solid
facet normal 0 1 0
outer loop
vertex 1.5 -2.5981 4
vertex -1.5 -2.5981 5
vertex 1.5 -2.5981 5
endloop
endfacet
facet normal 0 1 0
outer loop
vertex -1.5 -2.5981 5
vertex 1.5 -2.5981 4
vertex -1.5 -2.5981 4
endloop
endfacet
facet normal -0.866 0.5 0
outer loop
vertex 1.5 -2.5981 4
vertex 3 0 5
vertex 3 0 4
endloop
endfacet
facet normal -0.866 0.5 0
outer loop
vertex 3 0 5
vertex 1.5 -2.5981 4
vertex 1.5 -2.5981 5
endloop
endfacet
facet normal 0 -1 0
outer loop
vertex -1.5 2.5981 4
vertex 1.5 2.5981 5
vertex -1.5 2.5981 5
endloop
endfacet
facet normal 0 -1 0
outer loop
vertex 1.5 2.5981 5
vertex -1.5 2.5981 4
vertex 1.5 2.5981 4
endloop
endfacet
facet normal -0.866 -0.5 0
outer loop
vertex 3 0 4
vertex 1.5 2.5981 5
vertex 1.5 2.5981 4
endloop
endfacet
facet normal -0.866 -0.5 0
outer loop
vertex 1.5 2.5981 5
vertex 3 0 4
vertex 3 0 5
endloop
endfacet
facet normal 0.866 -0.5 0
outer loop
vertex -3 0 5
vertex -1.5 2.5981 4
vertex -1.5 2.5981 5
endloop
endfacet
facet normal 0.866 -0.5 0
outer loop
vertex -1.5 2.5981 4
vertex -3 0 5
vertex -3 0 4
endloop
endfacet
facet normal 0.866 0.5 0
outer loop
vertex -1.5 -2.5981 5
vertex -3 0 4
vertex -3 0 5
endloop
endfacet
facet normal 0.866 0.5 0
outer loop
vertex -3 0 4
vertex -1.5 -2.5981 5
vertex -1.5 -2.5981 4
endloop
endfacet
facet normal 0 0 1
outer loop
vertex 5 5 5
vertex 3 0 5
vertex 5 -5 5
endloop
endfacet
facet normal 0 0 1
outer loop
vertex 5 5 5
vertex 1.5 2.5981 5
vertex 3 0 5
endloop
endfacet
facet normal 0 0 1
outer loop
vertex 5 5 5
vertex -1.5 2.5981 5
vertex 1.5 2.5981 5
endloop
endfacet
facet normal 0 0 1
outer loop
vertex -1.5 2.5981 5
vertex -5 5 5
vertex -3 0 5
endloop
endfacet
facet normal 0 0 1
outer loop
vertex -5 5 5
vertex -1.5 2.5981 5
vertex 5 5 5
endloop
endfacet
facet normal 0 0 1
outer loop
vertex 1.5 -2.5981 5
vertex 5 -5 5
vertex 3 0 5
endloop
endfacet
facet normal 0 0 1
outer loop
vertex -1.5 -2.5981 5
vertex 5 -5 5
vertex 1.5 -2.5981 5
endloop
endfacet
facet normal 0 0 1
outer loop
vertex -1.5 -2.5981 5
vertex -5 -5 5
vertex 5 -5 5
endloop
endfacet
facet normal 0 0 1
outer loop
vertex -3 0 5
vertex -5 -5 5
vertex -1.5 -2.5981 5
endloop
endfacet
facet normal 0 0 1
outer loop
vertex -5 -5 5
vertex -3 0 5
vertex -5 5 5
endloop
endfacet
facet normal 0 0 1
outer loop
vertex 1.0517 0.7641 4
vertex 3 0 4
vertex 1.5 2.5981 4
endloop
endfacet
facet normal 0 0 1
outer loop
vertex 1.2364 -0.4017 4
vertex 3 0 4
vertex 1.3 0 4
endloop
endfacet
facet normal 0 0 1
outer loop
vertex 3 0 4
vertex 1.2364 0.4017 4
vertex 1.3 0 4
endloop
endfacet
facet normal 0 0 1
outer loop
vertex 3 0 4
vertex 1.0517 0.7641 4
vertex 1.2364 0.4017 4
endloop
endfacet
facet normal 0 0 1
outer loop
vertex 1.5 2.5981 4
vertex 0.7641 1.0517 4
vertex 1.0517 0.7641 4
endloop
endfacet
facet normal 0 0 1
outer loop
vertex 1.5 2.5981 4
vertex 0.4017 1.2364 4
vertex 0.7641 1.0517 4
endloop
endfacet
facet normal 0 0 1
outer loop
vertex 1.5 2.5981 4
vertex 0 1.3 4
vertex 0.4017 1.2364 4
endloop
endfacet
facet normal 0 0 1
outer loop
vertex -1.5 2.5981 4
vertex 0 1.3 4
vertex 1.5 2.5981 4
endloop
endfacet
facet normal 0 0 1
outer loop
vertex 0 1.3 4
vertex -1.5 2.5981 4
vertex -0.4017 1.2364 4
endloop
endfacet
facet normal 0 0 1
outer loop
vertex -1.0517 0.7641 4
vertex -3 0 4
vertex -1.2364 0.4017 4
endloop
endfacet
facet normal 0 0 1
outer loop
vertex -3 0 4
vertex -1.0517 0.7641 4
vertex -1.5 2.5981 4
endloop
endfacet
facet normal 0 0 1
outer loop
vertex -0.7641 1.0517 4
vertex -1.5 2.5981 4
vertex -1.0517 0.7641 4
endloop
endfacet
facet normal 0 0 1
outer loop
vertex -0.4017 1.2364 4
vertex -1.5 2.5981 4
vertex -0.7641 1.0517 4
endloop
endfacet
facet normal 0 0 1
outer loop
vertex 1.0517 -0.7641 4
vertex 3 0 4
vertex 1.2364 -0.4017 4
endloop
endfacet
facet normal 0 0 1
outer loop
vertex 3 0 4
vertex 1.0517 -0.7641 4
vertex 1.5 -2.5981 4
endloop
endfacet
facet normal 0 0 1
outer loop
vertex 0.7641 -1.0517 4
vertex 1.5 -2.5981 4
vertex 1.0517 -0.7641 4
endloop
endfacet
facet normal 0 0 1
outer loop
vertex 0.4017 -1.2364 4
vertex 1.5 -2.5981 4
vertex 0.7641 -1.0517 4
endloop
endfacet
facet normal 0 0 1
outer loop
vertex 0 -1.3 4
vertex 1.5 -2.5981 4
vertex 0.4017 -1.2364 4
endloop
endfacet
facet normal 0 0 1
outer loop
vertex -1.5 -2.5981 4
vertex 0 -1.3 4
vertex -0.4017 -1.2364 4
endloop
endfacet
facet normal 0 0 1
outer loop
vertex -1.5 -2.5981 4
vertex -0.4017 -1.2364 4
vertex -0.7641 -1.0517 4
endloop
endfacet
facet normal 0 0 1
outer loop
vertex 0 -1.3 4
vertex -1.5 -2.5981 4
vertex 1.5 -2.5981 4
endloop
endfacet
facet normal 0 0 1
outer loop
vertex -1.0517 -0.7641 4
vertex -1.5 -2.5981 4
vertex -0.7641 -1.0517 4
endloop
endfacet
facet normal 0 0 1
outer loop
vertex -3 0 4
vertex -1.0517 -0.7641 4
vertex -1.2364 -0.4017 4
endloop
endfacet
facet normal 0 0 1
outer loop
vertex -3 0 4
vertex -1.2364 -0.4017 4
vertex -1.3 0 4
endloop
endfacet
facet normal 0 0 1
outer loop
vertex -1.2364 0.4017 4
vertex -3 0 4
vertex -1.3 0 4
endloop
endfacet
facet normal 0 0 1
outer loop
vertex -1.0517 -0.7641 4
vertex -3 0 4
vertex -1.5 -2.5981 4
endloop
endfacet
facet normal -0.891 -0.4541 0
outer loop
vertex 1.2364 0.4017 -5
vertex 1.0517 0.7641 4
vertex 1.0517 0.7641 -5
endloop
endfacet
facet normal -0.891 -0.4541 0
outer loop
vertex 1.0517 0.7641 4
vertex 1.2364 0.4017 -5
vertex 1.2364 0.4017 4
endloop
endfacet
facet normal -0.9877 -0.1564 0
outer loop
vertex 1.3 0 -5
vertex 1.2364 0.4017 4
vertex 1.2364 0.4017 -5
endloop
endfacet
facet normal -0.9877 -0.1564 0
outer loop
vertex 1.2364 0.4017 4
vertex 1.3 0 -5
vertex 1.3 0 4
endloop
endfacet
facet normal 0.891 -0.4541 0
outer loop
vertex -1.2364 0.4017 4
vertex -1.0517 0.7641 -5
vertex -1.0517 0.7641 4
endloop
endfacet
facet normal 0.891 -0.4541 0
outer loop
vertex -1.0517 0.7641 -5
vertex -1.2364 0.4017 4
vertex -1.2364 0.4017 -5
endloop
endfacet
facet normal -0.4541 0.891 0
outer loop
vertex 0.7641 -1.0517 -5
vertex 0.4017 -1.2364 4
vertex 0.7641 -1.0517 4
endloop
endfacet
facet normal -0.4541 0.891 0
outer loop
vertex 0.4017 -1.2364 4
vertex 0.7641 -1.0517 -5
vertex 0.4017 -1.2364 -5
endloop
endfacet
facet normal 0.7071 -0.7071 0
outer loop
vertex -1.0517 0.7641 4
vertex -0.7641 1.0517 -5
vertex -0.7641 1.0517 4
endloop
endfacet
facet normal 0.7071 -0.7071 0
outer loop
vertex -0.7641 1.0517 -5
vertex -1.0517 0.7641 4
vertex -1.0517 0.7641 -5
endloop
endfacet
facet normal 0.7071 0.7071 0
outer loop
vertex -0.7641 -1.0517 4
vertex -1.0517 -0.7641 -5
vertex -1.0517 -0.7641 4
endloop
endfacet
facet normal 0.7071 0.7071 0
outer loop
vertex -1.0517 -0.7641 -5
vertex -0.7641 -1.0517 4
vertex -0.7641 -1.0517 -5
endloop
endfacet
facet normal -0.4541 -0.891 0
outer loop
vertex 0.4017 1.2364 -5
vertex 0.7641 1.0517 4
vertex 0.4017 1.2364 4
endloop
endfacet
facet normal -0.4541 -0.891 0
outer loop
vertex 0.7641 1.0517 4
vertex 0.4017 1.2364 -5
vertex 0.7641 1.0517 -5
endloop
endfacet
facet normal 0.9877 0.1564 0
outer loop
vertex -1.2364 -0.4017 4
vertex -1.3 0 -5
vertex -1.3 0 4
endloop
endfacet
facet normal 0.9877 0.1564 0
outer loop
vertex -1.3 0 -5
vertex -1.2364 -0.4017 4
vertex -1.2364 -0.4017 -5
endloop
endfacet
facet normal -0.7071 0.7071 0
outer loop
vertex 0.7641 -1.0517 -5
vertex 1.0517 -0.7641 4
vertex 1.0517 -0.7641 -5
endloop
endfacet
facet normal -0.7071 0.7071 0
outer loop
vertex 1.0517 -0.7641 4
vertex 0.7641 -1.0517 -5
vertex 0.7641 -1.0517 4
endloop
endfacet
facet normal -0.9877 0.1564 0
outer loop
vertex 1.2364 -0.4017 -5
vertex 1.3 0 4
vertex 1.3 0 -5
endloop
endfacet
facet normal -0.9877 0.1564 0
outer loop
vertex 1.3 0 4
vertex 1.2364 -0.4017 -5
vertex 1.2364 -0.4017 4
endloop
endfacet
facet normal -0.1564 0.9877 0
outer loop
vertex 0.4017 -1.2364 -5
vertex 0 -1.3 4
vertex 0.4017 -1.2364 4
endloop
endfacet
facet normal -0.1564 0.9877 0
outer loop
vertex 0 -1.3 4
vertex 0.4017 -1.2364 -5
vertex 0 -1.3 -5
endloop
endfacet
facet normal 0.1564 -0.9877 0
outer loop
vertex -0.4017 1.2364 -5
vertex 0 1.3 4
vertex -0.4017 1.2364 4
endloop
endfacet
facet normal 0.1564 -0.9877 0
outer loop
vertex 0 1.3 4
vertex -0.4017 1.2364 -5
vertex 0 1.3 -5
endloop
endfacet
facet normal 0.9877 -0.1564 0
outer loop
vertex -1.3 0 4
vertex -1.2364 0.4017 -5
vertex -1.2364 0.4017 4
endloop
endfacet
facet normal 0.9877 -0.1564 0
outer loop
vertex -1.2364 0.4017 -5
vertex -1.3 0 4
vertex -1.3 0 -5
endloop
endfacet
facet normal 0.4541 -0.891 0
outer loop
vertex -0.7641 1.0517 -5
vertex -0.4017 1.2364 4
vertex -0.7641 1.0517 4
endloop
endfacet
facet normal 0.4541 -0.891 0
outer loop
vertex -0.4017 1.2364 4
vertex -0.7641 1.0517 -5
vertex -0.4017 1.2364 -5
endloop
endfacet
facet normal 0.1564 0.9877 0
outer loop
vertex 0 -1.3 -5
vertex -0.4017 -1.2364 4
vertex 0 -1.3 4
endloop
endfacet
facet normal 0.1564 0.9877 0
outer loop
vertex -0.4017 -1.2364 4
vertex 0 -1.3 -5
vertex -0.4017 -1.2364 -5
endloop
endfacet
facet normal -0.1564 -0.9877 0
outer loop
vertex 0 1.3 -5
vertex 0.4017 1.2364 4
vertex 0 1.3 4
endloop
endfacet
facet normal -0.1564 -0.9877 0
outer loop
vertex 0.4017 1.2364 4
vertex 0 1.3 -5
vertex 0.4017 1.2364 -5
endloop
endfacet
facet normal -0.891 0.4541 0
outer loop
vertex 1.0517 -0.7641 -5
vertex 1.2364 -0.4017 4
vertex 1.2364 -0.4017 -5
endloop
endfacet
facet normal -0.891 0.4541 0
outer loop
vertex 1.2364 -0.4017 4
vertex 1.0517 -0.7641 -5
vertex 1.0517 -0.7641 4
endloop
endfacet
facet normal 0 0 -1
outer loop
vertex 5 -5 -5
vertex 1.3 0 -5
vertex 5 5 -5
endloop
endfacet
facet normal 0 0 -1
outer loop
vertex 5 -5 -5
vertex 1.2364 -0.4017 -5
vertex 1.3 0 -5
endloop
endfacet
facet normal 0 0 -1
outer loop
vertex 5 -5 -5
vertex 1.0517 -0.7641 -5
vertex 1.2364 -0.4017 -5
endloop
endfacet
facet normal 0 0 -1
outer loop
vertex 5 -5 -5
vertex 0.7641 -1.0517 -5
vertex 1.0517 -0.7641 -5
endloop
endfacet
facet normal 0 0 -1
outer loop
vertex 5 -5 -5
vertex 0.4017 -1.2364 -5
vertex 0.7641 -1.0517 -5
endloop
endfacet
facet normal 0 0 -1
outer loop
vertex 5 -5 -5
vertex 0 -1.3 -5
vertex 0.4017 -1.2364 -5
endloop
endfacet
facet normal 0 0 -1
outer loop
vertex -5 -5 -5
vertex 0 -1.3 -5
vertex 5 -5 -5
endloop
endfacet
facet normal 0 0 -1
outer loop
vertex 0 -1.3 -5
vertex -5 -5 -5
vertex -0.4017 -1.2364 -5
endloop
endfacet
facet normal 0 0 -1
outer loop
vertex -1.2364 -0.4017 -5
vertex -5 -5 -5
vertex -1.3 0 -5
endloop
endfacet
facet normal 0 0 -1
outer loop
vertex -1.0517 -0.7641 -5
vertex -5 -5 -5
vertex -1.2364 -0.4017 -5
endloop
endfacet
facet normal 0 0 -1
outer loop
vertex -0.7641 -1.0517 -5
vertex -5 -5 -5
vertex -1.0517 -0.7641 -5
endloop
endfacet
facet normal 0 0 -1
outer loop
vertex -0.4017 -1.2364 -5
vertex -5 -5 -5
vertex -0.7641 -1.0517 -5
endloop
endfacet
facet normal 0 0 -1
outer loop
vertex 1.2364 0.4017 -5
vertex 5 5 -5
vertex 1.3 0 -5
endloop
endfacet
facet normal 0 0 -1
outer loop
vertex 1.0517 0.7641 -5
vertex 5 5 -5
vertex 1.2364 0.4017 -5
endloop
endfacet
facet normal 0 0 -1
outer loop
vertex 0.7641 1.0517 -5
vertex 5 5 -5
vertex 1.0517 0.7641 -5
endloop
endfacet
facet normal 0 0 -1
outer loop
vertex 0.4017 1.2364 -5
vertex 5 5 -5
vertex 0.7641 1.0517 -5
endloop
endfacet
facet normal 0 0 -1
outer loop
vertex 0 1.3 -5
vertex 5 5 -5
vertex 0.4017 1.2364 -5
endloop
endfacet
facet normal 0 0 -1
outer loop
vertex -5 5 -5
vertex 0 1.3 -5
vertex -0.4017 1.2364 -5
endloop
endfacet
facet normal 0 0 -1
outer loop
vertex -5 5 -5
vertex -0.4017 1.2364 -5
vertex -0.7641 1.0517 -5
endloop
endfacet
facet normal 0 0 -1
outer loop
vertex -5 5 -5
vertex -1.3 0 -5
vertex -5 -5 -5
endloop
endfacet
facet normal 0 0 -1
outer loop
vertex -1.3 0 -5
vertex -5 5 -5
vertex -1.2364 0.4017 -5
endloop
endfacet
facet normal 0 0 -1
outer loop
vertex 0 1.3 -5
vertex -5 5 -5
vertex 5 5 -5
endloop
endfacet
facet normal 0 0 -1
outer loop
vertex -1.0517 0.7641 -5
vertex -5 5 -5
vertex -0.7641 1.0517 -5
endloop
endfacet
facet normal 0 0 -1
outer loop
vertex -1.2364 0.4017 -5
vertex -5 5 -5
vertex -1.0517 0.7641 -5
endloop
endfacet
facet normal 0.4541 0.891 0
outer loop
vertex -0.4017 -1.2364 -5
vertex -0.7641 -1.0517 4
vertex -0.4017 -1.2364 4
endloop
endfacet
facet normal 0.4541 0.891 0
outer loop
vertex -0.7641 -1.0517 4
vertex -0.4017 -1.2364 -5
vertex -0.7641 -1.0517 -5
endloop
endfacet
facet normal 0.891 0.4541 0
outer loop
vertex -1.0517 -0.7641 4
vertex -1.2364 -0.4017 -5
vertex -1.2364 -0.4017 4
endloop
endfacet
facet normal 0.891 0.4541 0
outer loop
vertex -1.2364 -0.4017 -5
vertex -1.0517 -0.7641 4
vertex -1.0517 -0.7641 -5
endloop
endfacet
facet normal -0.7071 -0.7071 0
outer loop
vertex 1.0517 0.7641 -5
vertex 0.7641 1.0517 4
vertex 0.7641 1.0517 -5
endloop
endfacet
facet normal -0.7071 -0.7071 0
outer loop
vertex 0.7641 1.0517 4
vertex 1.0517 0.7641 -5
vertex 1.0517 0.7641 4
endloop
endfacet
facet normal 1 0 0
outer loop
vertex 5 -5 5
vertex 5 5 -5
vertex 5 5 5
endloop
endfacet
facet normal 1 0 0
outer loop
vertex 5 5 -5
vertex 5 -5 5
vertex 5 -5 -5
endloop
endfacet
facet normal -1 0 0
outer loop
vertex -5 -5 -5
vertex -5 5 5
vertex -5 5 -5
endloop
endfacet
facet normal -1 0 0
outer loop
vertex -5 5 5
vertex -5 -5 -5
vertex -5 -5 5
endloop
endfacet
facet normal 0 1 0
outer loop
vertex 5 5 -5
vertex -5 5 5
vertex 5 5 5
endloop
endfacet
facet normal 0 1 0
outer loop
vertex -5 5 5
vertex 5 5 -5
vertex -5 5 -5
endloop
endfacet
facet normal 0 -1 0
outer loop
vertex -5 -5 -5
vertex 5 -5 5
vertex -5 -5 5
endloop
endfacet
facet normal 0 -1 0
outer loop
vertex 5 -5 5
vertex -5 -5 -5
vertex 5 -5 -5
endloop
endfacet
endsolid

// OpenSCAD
$fn = 6;

difference()
{
	cube([10,10,10,], center=true);
	
	union()
	{
		translate([0,0,4]) cylinder(r=3, h=1, $fn=6);
		cylinder(r=1.3, h=10, center=true, $fn=20);
	}
}
